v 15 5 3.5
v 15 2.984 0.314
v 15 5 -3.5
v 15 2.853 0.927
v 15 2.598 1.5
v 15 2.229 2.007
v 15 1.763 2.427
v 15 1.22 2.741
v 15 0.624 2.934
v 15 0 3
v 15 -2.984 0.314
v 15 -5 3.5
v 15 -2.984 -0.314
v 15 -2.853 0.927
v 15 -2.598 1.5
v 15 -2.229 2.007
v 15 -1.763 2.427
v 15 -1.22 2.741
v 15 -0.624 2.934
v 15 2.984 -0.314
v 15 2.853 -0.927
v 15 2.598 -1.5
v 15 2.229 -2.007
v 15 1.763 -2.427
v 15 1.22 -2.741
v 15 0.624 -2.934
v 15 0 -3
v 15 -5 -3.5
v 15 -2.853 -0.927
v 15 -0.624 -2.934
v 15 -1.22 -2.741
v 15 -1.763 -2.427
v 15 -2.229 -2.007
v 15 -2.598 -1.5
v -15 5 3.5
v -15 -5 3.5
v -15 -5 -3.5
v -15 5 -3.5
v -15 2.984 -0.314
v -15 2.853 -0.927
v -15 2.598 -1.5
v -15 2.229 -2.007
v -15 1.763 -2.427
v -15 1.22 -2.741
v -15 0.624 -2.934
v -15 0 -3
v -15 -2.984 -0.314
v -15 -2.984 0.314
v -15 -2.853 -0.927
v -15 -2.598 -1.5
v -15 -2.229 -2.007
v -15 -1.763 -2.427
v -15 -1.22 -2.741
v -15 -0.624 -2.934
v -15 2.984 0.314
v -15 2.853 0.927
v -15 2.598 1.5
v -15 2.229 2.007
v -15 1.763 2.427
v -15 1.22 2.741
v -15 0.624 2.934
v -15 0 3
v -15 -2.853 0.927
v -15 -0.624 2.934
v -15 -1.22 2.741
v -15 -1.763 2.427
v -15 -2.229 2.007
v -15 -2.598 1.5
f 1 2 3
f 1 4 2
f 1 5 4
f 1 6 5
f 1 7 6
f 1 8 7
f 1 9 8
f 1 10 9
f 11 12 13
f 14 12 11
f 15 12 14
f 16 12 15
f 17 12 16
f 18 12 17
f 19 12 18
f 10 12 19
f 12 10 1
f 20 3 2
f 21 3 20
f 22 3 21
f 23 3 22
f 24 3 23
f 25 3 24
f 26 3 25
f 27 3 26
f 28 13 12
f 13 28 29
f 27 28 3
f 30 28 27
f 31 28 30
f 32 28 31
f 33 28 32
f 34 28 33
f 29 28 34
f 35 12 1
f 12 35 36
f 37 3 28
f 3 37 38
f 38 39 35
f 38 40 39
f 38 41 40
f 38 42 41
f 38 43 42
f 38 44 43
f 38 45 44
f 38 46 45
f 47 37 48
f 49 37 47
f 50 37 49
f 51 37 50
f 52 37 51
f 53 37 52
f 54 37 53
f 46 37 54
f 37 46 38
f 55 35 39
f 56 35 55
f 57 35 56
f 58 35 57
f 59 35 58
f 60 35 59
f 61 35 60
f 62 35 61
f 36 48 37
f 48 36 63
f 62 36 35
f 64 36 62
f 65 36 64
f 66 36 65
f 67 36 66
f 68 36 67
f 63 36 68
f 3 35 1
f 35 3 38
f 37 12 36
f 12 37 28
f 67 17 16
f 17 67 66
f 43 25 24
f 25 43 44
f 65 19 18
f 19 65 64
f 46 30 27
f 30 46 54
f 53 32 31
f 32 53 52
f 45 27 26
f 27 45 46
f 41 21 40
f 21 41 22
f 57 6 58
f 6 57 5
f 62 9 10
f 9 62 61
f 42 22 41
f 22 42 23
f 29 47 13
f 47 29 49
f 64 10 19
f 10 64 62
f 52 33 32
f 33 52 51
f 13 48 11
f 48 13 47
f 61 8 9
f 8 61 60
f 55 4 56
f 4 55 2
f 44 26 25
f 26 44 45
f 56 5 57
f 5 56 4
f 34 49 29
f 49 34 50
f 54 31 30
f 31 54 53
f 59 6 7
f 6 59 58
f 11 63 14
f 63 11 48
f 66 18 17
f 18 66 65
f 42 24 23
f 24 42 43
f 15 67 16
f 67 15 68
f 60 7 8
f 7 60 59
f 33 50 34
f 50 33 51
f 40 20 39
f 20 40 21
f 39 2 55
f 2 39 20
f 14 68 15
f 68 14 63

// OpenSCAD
// Liquiddetector



Sensorlaenge = 30;
Sensor();

module Sensor() {
    $fn=30;
    difference(){
        cube ([Sensorlaenge,10,7],center=true);
        rotate([0,90,0])
        cylinder(r=3,h=Sensorlaenge+2, center=true);
    }

//    translate([0,7,0])
//    cube ([Sensorlaenge,5,2],center=true);
}
